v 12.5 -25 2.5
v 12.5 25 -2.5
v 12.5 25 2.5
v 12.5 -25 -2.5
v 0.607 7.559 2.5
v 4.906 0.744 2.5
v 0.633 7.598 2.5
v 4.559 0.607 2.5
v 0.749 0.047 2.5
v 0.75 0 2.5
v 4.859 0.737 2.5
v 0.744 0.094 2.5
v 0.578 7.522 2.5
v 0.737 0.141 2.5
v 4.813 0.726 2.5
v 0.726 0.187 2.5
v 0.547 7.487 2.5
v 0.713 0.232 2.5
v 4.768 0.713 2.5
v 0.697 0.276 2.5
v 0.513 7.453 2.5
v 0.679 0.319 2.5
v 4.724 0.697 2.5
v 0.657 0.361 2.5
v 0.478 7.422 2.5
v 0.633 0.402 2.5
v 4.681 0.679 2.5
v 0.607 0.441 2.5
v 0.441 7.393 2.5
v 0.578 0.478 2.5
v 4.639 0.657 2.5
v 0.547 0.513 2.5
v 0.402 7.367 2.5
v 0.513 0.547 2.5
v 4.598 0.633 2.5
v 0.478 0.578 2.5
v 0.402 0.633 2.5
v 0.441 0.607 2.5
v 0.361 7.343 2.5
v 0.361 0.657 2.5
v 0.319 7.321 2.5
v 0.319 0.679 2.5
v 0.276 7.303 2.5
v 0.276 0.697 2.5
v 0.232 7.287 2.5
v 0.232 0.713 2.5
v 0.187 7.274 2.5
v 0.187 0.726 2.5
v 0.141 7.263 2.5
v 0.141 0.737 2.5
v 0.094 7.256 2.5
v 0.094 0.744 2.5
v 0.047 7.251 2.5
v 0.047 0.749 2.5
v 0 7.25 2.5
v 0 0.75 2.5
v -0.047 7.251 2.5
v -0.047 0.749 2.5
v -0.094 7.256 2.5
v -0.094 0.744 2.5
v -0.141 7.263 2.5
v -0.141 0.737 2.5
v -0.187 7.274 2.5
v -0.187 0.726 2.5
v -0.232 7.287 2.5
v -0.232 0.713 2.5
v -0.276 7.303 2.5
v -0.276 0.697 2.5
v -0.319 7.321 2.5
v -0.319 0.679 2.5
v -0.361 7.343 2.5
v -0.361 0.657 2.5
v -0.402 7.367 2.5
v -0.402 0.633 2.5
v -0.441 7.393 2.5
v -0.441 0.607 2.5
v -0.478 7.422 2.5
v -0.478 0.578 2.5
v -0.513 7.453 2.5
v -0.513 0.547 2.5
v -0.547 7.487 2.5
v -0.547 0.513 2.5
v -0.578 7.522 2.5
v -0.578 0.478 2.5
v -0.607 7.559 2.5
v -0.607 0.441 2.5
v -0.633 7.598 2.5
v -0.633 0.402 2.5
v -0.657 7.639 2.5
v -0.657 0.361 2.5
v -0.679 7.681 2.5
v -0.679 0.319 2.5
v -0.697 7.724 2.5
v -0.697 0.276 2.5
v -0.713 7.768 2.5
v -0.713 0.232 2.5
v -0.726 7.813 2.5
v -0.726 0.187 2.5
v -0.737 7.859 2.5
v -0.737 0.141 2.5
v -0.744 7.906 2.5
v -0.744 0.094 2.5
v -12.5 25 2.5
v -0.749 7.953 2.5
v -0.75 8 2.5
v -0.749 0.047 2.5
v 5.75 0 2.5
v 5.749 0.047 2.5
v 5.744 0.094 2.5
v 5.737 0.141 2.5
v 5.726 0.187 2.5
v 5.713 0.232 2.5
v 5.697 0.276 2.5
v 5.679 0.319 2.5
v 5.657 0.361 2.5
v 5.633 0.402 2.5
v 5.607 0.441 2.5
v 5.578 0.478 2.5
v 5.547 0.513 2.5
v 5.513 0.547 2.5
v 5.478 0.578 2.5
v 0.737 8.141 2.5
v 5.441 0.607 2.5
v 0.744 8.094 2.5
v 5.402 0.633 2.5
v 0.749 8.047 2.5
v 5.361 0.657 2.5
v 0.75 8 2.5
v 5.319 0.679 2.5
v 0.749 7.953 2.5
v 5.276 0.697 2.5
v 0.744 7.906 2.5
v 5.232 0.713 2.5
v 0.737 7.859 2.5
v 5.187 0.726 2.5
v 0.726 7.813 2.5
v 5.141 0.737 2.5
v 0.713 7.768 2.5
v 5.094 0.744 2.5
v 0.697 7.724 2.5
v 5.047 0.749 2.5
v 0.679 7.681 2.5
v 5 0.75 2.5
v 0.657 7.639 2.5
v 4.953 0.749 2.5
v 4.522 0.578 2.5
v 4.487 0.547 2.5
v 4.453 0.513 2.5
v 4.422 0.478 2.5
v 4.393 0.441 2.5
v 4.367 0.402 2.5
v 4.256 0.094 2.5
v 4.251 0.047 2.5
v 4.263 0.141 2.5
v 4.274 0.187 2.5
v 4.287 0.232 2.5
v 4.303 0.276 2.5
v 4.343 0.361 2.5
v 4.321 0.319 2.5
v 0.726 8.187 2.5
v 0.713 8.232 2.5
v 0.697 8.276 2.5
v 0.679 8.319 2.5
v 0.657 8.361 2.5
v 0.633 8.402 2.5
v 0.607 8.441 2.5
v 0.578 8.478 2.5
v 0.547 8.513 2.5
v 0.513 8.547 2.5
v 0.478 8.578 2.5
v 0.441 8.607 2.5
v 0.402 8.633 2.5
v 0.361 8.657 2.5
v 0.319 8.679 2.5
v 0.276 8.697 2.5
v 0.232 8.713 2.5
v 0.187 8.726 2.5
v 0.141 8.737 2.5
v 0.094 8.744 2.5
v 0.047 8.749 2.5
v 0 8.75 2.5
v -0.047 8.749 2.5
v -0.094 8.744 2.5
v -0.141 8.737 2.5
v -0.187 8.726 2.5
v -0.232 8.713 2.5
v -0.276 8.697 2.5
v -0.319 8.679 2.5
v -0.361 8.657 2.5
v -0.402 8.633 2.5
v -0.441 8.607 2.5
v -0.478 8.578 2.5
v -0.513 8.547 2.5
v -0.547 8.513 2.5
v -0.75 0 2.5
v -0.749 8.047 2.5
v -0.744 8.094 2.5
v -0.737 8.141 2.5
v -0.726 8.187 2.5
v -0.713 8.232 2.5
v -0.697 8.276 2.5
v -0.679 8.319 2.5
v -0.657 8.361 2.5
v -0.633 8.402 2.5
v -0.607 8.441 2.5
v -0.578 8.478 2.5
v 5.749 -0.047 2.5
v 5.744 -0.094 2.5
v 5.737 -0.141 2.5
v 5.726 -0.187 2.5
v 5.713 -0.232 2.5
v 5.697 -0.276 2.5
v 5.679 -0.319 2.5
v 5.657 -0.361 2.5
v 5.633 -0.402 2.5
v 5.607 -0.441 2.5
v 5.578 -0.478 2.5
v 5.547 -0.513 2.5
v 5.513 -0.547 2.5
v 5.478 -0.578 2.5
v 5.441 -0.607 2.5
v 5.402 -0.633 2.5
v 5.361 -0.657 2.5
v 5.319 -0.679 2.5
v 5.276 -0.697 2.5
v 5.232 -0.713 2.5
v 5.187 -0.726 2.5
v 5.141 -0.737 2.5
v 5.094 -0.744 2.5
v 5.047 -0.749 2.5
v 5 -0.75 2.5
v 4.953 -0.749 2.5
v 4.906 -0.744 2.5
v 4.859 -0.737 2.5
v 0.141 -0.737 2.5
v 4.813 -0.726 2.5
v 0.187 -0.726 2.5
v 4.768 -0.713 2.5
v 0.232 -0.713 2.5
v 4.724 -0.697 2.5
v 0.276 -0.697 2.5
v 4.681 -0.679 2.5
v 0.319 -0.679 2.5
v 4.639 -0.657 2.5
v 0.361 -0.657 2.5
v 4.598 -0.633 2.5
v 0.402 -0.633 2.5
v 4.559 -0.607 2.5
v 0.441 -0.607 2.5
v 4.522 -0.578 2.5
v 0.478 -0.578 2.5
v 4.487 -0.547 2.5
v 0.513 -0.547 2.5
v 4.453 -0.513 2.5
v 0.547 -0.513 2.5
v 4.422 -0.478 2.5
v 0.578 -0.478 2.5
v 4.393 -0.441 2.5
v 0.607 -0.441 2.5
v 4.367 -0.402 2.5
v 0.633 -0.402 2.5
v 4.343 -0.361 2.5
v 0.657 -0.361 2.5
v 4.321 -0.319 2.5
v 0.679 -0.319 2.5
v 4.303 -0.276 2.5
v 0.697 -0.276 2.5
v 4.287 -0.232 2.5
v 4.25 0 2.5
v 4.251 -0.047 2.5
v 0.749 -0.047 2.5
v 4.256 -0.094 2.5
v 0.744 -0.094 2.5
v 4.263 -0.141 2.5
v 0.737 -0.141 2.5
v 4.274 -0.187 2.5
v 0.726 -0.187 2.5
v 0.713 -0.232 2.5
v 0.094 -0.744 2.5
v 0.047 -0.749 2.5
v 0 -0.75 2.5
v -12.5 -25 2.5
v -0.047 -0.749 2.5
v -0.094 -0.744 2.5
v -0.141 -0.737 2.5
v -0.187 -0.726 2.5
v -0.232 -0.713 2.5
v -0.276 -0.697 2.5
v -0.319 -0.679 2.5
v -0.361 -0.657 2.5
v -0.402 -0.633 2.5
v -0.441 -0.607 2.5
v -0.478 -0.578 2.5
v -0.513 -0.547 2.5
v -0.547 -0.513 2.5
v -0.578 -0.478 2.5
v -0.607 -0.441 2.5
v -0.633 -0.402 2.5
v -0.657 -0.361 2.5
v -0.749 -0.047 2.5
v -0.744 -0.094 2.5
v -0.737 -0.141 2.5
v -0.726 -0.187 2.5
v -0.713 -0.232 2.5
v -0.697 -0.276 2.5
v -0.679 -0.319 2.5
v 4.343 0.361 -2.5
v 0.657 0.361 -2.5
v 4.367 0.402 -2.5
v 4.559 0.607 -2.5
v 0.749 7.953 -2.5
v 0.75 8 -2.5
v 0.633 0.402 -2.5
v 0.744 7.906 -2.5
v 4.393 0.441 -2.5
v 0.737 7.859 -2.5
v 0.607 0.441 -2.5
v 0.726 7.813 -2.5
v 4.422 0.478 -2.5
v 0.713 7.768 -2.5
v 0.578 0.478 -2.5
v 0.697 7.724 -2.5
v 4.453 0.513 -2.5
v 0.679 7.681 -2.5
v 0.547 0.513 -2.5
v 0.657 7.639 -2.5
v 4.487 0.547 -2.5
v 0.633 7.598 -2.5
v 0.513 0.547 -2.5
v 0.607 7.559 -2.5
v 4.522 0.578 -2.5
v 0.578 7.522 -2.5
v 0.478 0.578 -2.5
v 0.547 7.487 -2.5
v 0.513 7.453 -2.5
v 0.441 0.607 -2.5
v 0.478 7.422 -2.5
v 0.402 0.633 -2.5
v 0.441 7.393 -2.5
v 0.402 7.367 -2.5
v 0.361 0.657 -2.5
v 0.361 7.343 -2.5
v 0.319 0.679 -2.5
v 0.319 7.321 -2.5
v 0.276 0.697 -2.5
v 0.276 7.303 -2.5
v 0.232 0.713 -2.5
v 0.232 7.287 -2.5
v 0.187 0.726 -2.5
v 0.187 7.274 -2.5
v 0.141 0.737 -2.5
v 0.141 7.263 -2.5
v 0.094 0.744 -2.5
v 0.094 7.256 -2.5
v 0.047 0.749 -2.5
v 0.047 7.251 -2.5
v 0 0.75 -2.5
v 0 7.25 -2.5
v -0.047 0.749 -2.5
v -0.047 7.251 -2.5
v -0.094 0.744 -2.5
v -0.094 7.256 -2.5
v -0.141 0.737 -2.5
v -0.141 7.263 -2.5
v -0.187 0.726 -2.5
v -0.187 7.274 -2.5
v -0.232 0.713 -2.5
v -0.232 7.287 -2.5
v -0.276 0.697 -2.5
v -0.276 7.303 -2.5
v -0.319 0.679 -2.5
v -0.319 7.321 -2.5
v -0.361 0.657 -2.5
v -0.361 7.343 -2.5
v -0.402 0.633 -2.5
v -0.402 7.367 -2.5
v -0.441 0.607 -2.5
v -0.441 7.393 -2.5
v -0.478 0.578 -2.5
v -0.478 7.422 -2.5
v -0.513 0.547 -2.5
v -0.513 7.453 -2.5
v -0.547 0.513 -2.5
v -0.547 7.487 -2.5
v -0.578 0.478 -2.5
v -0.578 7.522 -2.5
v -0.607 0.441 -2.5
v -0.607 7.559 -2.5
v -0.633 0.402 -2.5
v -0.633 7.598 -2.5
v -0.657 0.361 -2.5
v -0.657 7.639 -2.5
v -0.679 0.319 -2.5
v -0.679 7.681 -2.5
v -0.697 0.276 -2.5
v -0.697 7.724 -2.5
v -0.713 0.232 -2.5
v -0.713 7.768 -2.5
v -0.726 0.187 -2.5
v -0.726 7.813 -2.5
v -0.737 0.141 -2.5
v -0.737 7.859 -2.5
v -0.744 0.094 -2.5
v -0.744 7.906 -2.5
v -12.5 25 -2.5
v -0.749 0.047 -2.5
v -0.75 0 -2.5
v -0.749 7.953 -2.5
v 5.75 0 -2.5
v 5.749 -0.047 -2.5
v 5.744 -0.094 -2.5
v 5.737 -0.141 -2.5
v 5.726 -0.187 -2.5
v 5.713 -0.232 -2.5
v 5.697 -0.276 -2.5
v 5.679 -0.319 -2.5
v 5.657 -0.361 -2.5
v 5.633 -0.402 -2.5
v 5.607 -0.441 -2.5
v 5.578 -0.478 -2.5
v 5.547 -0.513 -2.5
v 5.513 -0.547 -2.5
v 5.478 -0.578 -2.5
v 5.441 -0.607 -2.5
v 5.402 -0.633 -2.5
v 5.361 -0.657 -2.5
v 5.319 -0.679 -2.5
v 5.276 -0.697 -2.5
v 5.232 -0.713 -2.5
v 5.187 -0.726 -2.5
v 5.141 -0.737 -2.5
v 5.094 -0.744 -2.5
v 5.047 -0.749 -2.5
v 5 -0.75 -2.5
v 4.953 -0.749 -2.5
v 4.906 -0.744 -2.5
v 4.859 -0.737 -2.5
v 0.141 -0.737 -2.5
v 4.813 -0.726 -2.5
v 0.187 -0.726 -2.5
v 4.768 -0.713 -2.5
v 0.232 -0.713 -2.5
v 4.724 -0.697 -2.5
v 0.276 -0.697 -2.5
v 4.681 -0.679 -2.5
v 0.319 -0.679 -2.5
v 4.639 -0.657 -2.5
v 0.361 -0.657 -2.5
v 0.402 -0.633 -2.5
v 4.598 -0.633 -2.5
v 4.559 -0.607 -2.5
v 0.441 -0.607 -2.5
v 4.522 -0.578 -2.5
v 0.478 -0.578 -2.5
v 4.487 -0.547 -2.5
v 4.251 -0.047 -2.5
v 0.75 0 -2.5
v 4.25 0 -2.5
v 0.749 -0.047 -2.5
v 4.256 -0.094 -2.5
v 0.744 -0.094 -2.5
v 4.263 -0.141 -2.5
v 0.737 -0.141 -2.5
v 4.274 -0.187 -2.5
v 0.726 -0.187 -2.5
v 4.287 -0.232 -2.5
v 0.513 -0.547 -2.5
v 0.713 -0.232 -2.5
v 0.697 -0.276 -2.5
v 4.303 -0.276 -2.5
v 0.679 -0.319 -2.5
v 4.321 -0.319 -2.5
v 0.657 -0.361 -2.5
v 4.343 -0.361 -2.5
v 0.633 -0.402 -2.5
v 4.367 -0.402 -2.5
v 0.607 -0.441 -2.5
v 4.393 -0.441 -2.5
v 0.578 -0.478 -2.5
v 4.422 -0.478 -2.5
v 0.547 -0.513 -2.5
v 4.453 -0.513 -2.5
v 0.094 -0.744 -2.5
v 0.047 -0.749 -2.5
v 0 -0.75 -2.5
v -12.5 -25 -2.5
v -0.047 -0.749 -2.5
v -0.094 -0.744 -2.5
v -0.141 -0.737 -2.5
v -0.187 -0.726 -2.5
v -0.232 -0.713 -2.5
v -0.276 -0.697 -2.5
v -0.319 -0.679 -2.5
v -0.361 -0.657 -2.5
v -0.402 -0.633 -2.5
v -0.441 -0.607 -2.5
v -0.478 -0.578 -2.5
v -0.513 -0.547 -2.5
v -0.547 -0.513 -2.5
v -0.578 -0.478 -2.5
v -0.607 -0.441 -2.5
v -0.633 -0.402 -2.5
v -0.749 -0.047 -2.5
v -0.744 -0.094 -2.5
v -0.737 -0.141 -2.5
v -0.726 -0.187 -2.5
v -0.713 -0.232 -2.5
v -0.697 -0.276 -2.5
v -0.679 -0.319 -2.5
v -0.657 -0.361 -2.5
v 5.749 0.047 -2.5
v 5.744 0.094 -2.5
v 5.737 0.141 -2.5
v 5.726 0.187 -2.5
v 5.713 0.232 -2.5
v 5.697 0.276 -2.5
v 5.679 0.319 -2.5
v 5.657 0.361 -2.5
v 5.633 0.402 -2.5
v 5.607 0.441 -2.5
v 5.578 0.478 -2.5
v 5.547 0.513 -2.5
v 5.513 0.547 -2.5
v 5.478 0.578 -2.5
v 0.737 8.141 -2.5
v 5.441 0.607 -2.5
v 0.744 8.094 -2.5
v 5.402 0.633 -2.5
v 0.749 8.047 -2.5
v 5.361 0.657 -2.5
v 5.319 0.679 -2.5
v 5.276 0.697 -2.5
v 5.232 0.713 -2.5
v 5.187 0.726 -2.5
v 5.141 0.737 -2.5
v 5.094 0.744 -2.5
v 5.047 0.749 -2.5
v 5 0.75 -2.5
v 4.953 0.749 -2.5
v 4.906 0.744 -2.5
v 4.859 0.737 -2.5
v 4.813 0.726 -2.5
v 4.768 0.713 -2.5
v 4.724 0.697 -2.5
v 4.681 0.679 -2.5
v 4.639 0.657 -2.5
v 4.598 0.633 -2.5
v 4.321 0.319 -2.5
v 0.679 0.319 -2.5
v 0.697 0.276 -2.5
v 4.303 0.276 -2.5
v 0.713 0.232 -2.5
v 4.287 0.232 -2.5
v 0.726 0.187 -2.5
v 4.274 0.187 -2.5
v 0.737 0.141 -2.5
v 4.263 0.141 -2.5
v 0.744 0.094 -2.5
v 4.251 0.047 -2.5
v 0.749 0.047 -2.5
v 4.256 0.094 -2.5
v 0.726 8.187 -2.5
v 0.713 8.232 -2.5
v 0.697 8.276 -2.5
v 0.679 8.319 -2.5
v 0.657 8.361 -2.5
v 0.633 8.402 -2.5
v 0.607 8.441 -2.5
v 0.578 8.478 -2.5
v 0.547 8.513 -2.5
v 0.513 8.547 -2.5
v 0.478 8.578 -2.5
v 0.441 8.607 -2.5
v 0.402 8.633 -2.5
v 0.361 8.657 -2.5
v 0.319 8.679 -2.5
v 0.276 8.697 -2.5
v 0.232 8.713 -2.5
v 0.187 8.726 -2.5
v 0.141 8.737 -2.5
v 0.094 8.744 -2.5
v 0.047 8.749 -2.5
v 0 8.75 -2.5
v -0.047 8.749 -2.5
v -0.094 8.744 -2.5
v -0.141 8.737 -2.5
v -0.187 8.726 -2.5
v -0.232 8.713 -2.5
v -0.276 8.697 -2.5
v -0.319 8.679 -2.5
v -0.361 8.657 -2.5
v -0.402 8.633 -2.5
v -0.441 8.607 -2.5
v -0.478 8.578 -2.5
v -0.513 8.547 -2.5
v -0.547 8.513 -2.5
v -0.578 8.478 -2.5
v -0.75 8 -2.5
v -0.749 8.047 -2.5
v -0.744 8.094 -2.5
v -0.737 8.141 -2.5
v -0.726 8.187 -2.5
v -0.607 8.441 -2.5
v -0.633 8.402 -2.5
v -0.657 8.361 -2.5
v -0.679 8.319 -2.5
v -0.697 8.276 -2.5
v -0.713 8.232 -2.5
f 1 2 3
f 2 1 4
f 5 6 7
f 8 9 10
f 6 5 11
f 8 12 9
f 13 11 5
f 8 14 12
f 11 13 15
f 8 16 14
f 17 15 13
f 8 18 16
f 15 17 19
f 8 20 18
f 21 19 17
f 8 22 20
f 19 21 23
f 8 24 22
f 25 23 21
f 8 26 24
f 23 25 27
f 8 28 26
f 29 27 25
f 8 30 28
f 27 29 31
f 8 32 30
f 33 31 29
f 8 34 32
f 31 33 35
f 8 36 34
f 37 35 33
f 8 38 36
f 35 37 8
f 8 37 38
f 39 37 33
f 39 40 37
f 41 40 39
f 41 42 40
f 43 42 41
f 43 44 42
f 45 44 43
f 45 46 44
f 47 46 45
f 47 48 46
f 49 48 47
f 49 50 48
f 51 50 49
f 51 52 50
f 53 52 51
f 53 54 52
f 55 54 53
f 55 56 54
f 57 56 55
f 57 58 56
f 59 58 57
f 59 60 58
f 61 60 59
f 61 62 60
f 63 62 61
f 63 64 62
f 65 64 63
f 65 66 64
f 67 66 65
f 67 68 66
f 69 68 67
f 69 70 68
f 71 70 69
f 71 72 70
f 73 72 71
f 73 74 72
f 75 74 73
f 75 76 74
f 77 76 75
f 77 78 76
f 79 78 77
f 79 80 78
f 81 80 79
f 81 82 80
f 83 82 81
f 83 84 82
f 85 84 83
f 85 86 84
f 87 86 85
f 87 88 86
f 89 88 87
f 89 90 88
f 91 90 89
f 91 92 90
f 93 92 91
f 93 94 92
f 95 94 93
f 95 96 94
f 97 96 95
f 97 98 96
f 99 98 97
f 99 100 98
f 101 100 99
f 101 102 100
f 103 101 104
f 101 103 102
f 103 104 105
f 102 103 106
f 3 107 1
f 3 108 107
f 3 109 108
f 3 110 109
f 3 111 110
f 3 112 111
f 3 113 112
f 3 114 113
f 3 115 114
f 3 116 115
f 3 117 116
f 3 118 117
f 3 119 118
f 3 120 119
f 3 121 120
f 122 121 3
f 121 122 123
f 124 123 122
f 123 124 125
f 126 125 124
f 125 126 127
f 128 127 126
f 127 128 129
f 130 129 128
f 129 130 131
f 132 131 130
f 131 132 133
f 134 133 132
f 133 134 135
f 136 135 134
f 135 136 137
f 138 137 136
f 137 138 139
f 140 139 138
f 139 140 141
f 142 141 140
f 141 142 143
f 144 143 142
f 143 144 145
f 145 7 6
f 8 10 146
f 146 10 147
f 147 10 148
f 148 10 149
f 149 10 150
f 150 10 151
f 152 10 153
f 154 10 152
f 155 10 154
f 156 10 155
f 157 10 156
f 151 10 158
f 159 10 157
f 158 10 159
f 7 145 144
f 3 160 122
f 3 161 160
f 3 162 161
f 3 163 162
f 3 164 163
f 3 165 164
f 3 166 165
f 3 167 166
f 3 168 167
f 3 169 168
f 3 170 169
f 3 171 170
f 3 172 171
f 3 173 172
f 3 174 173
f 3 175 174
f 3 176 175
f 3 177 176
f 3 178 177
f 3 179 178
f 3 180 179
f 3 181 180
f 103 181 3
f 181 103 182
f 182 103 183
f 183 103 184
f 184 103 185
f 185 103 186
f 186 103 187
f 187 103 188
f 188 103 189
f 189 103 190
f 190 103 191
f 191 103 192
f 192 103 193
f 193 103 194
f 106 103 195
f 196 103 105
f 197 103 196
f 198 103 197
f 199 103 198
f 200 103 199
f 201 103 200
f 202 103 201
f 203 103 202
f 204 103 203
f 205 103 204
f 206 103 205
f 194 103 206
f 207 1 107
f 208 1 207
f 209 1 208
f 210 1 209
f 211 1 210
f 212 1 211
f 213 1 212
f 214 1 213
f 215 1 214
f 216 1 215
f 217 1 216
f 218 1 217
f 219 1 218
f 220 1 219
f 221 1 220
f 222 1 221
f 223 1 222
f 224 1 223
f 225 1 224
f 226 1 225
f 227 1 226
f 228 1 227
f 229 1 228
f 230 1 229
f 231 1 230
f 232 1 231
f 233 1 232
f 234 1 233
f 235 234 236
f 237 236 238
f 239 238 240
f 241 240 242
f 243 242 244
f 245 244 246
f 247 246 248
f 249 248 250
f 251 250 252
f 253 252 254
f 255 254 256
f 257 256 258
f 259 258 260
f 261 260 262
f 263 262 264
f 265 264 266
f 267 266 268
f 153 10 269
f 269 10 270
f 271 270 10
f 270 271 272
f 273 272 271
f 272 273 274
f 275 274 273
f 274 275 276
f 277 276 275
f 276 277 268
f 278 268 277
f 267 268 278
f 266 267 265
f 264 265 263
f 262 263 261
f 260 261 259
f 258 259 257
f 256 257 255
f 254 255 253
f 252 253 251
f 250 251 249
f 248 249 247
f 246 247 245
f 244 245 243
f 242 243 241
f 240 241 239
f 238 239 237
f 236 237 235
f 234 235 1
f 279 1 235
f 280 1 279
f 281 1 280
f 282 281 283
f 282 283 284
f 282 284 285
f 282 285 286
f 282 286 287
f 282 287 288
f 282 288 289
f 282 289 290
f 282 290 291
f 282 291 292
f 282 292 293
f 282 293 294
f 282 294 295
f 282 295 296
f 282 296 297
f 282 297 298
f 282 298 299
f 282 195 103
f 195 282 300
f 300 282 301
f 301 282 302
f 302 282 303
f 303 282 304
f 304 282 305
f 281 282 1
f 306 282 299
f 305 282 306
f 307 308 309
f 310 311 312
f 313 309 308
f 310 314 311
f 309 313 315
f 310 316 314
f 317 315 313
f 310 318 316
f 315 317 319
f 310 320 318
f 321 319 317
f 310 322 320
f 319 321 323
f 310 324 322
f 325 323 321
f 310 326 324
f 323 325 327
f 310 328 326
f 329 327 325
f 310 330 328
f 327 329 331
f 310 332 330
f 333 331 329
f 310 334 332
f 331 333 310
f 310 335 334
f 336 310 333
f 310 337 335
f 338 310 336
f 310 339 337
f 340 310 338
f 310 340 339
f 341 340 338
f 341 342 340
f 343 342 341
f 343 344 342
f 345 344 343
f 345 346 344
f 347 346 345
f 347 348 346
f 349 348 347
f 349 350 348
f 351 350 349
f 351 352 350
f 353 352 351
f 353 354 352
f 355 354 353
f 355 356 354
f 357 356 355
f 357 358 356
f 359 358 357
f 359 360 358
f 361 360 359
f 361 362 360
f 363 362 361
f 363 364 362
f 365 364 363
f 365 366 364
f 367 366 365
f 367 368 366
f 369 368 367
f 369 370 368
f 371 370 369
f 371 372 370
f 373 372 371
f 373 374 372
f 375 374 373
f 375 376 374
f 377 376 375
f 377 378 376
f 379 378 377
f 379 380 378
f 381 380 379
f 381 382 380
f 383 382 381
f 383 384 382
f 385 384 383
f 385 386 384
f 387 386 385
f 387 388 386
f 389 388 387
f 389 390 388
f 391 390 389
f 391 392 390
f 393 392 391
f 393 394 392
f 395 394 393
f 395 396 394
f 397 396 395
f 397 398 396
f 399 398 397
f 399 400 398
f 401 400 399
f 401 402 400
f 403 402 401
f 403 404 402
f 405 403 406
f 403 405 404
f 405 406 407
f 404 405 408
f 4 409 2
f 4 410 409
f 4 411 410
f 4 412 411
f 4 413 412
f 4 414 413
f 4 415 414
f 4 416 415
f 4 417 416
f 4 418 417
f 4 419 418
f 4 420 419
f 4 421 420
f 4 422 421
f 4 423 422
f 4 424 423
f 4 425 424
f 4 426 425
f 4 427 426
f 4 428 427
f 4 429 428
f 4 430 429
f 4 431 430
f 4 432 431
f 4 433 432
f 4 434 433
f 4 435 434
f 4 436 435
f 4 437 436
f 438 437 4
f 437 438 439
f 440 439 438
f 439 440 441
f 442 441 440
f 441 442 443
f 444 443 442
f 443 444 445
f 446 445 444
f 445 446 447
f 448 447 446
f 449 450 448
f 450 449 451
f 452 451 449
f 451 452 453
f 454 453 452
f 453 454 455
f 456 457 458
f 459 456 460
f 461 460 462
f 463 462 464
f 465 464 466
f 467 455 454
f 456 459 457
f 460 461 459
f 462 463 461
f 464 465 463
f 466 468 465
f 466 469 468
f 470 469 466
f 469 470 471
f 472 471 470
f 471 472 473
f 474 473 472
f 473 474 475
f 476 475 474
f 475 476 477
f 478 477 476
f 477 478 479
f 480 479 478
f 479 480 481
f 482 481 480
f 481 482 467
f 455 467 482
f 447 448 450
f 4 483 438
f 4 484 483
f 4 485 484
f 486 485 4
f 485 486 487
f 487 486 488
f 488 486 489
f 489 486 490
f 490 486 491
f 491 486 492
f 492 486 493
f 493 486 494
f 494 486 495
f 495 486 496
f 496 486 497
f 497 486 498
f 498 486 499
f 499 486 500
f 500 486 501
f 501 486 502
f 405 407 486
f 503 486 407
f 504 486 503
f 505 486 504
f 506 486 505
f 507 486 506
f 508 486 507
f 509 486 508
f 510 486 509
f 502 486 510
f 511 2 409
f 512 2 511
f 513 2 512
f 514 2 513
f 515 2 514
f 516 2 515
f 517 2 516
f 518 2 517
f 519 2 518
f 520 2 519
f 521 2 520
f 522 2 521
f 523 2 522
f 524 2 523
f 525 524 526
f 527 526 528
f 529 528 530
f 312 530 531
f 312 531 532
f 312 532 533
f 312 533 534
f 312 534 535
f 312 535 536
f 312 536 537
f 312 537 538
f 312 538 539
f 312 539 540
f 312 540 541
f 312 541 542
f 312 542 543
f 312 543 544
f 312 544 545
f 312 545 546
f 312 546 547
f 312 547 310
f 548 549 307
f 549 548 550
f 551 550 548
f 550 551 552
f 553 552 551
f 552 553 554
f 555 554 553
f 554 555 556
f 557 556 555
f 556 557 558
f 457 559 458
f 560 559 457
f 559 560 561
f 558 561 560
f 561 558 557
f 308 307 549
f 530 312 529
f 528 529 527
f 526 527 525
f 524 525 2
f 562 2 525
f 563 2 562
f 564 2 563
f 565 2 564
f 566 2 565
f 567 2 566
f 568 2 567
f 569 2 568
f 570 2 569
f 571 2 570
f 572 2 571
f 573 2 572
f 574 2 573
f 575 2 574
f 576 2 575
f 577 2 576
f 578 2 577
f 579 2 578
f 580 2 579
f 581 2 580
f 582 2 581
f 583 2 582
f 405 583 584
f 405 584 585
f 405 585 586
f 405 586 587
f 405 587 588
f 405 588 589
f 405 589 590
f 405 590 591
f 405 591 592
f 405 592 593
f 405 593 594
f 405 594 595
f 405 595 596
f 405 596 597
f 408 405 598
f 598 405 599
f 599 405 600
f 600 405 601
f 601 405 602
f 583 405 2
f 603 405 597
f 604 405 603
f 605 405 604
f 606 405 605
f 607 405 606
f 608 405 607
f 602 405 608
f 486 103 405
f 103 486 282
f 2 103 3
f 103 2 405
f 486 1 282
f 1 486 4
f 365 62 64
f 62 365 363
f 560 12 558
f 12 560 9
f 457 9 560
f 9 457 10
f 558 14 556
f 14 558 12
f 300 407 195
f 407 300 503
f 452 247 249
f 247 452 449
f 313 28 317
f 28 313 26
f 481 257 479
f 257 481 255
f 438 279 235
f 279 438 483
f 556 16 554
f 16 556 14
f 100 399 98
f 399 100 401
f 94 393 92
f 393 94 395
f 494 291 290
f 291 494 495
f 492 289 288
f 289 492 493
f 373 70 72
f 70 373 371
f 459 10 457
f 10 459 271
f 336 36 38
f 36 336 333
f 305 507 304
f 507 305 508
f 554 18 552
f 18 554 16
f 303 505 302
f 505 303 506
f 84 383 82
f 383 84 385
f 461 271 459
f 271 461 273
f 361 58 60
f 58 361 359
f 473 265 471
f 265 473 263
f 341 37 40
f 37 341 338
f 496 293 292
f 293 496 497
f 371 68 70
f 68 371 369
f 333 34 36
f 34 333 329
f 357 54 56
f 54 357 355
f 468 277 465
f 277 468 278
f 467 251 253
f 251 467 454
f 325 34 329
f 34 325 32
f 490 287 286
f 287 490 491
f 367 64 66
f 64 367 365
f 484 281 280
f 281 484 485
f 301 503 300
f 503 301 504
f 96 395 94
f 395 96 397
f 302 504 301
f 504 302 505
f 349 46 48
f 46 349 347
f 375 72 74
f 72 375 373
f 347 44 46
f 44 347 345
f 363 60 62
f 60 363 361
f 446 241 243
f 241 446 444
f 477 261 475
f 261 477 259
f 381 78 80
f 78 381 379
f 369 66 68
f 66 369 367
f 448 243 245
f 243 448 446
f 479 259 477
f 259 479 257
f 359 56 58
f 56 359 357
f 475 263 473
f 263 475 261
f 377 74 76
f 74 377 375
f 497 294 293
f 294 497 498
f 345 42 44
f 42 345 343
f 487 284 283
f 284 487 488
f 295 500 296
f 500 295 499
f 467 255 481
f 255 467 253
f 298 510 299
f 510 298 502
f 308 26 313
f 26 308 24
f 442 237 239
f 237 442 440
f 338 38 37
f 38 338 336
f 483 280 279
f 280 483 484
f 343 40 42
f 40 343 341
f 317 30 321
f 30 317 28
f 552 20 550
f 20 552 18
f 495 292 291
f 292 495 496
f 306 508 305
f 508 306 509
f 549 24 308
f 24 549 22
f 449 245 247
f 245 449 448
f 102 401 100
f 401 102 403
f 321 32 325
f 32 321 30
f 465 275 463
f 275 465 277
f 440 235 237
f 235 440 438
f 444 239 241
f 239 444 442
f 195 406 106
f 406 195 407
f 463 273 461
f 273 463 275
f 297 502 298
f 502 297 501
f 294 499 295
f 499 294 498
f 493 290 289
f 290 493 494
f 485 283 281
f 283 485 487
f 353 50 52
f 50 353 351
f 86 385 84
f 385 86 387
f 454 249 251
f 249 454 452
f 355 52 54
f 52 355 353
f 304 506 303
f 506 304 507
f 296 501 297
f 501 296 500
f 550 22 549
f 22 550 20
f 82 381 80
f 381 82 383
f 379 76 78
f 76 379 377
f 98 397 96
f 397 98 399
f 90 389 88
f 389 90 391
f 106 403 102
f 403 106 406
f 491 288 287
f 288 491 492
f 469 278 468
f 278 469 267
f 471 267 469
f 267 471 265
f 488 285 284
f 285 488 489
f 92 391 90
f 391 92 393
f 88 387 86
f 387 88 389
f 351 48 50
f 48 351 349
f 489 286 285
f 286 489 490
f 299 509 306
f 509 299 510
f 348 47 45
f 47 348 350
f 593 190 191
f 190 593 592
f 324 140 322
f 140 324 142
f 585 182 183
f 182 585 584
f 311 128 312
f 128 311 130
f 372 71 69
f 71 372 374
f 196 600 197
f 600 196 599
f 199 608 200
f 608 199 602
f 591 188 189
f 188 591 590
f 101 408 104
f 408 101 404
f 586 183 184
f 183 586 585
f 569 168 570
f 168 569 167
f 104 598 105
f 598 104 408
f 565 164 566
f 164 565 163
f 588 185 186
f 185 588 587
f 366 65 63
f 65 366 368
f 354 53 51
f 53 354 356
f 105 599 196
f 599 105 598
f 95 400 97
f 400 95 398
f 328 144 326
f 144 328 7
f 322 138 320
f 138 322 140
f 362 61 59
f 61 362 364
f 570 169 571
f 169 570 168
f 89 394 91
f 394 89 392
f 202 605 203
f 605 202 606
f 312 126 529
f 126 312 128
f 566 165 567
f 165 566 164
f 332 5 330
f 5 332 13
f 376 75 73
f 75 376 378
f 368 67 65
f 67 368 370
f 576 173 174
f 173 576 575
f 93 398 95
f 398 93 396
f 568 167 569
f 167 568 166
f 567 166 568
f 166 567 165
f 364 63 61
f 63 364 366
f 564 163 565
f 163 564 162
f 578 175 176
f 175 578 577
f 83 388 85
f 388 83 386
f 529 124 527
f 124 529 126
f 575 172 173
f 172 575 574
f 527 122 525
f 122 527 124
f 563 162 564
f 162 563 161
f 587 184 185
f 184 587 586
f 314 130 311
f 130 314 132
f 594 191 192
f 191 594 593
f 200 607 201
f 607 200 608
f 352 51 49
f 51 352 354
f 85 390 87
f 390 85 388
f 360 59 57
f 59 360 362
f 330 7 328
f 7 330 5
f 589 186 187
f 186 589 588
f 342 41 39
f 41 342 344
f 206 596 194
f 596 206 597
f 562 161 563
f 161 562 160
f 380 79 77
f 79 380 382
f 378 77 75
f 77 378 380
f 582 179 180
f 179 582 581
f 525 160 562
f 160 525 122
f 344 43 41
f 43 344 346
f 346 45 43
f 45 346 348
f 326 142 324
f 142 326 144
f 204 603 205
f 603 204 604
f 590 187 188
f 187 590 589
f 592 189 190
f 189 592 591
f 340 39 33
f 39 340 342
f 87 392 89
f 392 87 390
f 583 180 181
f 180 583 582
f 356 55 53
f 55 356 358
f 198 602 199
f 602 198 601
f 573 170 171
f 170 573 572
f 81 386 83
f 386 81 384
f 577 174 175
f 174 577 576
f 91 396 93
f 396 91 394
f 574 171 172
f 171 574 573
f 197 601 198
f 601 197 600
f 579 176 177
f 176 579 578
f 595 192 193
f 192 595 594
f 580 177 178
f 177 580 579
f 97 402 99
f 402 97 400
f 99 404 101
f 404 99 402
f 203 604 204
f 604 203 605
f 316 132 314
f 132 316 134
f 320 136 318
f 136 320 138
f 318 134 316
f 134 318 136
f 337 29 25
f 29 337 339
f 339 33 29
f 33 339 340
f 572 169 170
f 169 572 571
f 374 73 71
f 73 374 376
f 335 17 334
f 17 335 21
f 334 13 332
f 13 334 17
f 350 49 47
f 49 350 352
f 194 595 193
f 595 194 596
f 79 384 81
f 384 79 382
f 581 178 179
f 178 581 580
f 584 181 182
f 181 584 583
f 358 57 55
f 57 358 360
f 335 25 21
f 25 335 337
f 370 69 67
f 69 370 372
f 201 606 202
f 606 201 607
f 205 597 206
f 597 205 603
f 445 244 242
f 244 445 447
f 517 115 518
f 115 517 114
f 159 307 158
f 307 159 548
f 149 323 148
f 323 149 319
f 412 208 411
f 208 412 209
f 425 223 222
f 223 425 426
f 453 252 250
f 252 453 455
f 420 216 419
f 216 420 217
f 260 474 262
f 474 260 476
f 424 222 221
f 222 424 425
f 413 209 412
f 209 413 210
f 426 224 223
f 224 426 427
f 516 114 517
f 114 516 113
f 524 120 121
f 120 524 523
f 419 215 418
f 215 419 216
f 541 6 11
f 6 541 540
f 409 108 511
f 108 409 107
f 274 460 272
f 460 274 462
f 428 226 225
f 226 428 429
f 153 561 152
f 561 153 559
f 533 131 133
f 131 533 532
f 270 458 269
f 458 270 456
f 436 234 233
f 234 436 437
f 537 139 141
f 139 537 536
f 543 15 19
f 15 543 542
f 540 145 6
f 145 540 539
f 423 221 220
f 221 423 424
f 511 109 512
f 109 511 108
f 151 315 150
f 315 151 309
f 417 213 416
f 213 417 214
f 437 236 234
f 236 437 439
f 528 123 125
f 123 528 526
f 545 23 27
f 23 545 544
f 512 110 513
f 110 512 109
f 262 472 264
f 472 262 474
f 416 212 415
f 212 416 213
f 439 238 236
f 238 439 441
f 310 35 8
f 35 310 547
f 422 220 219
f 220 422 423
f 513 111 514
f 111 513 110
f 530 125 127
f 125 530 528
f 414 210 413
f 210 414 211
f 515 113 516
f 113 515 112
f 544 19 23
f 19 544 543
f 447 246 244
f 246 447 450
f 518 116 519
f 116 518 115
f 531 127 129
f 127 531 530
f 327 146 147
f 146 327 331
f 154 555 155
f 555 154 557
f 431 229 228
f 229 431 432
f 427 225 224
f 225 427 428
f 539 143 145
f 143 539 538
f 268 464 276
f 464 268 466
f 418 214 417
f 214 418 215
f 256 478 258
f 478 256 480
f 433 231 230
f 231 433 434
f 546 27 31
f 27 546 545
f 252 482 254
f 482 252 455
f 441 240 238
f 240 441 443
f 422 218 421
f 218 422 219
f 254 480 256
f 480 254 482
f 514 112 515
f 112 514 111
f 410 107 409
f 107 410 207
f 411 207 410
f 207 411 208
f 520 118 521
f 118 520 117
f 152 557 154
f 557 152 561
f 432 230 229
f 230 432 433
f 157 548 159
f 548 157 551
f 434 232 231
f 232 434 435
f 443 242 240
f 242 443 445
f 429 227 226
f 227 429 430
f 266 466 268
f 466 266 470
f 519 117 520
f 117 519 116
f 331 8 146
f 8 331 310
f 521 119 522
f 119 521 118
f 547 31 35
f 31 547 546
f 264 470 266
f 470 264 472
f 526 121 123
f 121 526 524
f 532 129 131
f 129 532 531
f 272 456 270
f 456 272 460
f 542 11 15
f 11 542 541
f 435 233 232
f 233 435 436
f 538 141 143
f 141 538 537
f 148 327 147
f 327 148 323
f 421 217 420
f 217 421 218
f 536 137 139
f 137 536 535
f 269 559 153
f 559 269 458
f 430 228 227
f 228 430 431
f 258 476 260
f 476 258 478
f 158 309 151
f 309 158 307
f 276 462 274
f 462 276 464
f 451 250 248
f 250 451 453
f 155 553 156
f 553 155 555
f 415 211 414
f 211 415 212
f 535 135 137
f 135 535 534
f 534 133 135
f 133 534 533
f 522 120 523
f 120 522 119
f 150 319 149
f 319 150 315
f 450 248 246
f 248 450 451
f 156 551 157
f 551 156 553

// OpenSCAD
$fn = 100;
tack_d = 1.5;

difference(){
cube([25,50,5 ],true);
translate([0,0,-20])   
cylinder(d=tack_d,h=40);    
translate([0,8,-20])   
cylinder(d=tack_d,h=40);    
translate([5,0,-20])   
cylinder(d=tack_d,h=40);    
}
